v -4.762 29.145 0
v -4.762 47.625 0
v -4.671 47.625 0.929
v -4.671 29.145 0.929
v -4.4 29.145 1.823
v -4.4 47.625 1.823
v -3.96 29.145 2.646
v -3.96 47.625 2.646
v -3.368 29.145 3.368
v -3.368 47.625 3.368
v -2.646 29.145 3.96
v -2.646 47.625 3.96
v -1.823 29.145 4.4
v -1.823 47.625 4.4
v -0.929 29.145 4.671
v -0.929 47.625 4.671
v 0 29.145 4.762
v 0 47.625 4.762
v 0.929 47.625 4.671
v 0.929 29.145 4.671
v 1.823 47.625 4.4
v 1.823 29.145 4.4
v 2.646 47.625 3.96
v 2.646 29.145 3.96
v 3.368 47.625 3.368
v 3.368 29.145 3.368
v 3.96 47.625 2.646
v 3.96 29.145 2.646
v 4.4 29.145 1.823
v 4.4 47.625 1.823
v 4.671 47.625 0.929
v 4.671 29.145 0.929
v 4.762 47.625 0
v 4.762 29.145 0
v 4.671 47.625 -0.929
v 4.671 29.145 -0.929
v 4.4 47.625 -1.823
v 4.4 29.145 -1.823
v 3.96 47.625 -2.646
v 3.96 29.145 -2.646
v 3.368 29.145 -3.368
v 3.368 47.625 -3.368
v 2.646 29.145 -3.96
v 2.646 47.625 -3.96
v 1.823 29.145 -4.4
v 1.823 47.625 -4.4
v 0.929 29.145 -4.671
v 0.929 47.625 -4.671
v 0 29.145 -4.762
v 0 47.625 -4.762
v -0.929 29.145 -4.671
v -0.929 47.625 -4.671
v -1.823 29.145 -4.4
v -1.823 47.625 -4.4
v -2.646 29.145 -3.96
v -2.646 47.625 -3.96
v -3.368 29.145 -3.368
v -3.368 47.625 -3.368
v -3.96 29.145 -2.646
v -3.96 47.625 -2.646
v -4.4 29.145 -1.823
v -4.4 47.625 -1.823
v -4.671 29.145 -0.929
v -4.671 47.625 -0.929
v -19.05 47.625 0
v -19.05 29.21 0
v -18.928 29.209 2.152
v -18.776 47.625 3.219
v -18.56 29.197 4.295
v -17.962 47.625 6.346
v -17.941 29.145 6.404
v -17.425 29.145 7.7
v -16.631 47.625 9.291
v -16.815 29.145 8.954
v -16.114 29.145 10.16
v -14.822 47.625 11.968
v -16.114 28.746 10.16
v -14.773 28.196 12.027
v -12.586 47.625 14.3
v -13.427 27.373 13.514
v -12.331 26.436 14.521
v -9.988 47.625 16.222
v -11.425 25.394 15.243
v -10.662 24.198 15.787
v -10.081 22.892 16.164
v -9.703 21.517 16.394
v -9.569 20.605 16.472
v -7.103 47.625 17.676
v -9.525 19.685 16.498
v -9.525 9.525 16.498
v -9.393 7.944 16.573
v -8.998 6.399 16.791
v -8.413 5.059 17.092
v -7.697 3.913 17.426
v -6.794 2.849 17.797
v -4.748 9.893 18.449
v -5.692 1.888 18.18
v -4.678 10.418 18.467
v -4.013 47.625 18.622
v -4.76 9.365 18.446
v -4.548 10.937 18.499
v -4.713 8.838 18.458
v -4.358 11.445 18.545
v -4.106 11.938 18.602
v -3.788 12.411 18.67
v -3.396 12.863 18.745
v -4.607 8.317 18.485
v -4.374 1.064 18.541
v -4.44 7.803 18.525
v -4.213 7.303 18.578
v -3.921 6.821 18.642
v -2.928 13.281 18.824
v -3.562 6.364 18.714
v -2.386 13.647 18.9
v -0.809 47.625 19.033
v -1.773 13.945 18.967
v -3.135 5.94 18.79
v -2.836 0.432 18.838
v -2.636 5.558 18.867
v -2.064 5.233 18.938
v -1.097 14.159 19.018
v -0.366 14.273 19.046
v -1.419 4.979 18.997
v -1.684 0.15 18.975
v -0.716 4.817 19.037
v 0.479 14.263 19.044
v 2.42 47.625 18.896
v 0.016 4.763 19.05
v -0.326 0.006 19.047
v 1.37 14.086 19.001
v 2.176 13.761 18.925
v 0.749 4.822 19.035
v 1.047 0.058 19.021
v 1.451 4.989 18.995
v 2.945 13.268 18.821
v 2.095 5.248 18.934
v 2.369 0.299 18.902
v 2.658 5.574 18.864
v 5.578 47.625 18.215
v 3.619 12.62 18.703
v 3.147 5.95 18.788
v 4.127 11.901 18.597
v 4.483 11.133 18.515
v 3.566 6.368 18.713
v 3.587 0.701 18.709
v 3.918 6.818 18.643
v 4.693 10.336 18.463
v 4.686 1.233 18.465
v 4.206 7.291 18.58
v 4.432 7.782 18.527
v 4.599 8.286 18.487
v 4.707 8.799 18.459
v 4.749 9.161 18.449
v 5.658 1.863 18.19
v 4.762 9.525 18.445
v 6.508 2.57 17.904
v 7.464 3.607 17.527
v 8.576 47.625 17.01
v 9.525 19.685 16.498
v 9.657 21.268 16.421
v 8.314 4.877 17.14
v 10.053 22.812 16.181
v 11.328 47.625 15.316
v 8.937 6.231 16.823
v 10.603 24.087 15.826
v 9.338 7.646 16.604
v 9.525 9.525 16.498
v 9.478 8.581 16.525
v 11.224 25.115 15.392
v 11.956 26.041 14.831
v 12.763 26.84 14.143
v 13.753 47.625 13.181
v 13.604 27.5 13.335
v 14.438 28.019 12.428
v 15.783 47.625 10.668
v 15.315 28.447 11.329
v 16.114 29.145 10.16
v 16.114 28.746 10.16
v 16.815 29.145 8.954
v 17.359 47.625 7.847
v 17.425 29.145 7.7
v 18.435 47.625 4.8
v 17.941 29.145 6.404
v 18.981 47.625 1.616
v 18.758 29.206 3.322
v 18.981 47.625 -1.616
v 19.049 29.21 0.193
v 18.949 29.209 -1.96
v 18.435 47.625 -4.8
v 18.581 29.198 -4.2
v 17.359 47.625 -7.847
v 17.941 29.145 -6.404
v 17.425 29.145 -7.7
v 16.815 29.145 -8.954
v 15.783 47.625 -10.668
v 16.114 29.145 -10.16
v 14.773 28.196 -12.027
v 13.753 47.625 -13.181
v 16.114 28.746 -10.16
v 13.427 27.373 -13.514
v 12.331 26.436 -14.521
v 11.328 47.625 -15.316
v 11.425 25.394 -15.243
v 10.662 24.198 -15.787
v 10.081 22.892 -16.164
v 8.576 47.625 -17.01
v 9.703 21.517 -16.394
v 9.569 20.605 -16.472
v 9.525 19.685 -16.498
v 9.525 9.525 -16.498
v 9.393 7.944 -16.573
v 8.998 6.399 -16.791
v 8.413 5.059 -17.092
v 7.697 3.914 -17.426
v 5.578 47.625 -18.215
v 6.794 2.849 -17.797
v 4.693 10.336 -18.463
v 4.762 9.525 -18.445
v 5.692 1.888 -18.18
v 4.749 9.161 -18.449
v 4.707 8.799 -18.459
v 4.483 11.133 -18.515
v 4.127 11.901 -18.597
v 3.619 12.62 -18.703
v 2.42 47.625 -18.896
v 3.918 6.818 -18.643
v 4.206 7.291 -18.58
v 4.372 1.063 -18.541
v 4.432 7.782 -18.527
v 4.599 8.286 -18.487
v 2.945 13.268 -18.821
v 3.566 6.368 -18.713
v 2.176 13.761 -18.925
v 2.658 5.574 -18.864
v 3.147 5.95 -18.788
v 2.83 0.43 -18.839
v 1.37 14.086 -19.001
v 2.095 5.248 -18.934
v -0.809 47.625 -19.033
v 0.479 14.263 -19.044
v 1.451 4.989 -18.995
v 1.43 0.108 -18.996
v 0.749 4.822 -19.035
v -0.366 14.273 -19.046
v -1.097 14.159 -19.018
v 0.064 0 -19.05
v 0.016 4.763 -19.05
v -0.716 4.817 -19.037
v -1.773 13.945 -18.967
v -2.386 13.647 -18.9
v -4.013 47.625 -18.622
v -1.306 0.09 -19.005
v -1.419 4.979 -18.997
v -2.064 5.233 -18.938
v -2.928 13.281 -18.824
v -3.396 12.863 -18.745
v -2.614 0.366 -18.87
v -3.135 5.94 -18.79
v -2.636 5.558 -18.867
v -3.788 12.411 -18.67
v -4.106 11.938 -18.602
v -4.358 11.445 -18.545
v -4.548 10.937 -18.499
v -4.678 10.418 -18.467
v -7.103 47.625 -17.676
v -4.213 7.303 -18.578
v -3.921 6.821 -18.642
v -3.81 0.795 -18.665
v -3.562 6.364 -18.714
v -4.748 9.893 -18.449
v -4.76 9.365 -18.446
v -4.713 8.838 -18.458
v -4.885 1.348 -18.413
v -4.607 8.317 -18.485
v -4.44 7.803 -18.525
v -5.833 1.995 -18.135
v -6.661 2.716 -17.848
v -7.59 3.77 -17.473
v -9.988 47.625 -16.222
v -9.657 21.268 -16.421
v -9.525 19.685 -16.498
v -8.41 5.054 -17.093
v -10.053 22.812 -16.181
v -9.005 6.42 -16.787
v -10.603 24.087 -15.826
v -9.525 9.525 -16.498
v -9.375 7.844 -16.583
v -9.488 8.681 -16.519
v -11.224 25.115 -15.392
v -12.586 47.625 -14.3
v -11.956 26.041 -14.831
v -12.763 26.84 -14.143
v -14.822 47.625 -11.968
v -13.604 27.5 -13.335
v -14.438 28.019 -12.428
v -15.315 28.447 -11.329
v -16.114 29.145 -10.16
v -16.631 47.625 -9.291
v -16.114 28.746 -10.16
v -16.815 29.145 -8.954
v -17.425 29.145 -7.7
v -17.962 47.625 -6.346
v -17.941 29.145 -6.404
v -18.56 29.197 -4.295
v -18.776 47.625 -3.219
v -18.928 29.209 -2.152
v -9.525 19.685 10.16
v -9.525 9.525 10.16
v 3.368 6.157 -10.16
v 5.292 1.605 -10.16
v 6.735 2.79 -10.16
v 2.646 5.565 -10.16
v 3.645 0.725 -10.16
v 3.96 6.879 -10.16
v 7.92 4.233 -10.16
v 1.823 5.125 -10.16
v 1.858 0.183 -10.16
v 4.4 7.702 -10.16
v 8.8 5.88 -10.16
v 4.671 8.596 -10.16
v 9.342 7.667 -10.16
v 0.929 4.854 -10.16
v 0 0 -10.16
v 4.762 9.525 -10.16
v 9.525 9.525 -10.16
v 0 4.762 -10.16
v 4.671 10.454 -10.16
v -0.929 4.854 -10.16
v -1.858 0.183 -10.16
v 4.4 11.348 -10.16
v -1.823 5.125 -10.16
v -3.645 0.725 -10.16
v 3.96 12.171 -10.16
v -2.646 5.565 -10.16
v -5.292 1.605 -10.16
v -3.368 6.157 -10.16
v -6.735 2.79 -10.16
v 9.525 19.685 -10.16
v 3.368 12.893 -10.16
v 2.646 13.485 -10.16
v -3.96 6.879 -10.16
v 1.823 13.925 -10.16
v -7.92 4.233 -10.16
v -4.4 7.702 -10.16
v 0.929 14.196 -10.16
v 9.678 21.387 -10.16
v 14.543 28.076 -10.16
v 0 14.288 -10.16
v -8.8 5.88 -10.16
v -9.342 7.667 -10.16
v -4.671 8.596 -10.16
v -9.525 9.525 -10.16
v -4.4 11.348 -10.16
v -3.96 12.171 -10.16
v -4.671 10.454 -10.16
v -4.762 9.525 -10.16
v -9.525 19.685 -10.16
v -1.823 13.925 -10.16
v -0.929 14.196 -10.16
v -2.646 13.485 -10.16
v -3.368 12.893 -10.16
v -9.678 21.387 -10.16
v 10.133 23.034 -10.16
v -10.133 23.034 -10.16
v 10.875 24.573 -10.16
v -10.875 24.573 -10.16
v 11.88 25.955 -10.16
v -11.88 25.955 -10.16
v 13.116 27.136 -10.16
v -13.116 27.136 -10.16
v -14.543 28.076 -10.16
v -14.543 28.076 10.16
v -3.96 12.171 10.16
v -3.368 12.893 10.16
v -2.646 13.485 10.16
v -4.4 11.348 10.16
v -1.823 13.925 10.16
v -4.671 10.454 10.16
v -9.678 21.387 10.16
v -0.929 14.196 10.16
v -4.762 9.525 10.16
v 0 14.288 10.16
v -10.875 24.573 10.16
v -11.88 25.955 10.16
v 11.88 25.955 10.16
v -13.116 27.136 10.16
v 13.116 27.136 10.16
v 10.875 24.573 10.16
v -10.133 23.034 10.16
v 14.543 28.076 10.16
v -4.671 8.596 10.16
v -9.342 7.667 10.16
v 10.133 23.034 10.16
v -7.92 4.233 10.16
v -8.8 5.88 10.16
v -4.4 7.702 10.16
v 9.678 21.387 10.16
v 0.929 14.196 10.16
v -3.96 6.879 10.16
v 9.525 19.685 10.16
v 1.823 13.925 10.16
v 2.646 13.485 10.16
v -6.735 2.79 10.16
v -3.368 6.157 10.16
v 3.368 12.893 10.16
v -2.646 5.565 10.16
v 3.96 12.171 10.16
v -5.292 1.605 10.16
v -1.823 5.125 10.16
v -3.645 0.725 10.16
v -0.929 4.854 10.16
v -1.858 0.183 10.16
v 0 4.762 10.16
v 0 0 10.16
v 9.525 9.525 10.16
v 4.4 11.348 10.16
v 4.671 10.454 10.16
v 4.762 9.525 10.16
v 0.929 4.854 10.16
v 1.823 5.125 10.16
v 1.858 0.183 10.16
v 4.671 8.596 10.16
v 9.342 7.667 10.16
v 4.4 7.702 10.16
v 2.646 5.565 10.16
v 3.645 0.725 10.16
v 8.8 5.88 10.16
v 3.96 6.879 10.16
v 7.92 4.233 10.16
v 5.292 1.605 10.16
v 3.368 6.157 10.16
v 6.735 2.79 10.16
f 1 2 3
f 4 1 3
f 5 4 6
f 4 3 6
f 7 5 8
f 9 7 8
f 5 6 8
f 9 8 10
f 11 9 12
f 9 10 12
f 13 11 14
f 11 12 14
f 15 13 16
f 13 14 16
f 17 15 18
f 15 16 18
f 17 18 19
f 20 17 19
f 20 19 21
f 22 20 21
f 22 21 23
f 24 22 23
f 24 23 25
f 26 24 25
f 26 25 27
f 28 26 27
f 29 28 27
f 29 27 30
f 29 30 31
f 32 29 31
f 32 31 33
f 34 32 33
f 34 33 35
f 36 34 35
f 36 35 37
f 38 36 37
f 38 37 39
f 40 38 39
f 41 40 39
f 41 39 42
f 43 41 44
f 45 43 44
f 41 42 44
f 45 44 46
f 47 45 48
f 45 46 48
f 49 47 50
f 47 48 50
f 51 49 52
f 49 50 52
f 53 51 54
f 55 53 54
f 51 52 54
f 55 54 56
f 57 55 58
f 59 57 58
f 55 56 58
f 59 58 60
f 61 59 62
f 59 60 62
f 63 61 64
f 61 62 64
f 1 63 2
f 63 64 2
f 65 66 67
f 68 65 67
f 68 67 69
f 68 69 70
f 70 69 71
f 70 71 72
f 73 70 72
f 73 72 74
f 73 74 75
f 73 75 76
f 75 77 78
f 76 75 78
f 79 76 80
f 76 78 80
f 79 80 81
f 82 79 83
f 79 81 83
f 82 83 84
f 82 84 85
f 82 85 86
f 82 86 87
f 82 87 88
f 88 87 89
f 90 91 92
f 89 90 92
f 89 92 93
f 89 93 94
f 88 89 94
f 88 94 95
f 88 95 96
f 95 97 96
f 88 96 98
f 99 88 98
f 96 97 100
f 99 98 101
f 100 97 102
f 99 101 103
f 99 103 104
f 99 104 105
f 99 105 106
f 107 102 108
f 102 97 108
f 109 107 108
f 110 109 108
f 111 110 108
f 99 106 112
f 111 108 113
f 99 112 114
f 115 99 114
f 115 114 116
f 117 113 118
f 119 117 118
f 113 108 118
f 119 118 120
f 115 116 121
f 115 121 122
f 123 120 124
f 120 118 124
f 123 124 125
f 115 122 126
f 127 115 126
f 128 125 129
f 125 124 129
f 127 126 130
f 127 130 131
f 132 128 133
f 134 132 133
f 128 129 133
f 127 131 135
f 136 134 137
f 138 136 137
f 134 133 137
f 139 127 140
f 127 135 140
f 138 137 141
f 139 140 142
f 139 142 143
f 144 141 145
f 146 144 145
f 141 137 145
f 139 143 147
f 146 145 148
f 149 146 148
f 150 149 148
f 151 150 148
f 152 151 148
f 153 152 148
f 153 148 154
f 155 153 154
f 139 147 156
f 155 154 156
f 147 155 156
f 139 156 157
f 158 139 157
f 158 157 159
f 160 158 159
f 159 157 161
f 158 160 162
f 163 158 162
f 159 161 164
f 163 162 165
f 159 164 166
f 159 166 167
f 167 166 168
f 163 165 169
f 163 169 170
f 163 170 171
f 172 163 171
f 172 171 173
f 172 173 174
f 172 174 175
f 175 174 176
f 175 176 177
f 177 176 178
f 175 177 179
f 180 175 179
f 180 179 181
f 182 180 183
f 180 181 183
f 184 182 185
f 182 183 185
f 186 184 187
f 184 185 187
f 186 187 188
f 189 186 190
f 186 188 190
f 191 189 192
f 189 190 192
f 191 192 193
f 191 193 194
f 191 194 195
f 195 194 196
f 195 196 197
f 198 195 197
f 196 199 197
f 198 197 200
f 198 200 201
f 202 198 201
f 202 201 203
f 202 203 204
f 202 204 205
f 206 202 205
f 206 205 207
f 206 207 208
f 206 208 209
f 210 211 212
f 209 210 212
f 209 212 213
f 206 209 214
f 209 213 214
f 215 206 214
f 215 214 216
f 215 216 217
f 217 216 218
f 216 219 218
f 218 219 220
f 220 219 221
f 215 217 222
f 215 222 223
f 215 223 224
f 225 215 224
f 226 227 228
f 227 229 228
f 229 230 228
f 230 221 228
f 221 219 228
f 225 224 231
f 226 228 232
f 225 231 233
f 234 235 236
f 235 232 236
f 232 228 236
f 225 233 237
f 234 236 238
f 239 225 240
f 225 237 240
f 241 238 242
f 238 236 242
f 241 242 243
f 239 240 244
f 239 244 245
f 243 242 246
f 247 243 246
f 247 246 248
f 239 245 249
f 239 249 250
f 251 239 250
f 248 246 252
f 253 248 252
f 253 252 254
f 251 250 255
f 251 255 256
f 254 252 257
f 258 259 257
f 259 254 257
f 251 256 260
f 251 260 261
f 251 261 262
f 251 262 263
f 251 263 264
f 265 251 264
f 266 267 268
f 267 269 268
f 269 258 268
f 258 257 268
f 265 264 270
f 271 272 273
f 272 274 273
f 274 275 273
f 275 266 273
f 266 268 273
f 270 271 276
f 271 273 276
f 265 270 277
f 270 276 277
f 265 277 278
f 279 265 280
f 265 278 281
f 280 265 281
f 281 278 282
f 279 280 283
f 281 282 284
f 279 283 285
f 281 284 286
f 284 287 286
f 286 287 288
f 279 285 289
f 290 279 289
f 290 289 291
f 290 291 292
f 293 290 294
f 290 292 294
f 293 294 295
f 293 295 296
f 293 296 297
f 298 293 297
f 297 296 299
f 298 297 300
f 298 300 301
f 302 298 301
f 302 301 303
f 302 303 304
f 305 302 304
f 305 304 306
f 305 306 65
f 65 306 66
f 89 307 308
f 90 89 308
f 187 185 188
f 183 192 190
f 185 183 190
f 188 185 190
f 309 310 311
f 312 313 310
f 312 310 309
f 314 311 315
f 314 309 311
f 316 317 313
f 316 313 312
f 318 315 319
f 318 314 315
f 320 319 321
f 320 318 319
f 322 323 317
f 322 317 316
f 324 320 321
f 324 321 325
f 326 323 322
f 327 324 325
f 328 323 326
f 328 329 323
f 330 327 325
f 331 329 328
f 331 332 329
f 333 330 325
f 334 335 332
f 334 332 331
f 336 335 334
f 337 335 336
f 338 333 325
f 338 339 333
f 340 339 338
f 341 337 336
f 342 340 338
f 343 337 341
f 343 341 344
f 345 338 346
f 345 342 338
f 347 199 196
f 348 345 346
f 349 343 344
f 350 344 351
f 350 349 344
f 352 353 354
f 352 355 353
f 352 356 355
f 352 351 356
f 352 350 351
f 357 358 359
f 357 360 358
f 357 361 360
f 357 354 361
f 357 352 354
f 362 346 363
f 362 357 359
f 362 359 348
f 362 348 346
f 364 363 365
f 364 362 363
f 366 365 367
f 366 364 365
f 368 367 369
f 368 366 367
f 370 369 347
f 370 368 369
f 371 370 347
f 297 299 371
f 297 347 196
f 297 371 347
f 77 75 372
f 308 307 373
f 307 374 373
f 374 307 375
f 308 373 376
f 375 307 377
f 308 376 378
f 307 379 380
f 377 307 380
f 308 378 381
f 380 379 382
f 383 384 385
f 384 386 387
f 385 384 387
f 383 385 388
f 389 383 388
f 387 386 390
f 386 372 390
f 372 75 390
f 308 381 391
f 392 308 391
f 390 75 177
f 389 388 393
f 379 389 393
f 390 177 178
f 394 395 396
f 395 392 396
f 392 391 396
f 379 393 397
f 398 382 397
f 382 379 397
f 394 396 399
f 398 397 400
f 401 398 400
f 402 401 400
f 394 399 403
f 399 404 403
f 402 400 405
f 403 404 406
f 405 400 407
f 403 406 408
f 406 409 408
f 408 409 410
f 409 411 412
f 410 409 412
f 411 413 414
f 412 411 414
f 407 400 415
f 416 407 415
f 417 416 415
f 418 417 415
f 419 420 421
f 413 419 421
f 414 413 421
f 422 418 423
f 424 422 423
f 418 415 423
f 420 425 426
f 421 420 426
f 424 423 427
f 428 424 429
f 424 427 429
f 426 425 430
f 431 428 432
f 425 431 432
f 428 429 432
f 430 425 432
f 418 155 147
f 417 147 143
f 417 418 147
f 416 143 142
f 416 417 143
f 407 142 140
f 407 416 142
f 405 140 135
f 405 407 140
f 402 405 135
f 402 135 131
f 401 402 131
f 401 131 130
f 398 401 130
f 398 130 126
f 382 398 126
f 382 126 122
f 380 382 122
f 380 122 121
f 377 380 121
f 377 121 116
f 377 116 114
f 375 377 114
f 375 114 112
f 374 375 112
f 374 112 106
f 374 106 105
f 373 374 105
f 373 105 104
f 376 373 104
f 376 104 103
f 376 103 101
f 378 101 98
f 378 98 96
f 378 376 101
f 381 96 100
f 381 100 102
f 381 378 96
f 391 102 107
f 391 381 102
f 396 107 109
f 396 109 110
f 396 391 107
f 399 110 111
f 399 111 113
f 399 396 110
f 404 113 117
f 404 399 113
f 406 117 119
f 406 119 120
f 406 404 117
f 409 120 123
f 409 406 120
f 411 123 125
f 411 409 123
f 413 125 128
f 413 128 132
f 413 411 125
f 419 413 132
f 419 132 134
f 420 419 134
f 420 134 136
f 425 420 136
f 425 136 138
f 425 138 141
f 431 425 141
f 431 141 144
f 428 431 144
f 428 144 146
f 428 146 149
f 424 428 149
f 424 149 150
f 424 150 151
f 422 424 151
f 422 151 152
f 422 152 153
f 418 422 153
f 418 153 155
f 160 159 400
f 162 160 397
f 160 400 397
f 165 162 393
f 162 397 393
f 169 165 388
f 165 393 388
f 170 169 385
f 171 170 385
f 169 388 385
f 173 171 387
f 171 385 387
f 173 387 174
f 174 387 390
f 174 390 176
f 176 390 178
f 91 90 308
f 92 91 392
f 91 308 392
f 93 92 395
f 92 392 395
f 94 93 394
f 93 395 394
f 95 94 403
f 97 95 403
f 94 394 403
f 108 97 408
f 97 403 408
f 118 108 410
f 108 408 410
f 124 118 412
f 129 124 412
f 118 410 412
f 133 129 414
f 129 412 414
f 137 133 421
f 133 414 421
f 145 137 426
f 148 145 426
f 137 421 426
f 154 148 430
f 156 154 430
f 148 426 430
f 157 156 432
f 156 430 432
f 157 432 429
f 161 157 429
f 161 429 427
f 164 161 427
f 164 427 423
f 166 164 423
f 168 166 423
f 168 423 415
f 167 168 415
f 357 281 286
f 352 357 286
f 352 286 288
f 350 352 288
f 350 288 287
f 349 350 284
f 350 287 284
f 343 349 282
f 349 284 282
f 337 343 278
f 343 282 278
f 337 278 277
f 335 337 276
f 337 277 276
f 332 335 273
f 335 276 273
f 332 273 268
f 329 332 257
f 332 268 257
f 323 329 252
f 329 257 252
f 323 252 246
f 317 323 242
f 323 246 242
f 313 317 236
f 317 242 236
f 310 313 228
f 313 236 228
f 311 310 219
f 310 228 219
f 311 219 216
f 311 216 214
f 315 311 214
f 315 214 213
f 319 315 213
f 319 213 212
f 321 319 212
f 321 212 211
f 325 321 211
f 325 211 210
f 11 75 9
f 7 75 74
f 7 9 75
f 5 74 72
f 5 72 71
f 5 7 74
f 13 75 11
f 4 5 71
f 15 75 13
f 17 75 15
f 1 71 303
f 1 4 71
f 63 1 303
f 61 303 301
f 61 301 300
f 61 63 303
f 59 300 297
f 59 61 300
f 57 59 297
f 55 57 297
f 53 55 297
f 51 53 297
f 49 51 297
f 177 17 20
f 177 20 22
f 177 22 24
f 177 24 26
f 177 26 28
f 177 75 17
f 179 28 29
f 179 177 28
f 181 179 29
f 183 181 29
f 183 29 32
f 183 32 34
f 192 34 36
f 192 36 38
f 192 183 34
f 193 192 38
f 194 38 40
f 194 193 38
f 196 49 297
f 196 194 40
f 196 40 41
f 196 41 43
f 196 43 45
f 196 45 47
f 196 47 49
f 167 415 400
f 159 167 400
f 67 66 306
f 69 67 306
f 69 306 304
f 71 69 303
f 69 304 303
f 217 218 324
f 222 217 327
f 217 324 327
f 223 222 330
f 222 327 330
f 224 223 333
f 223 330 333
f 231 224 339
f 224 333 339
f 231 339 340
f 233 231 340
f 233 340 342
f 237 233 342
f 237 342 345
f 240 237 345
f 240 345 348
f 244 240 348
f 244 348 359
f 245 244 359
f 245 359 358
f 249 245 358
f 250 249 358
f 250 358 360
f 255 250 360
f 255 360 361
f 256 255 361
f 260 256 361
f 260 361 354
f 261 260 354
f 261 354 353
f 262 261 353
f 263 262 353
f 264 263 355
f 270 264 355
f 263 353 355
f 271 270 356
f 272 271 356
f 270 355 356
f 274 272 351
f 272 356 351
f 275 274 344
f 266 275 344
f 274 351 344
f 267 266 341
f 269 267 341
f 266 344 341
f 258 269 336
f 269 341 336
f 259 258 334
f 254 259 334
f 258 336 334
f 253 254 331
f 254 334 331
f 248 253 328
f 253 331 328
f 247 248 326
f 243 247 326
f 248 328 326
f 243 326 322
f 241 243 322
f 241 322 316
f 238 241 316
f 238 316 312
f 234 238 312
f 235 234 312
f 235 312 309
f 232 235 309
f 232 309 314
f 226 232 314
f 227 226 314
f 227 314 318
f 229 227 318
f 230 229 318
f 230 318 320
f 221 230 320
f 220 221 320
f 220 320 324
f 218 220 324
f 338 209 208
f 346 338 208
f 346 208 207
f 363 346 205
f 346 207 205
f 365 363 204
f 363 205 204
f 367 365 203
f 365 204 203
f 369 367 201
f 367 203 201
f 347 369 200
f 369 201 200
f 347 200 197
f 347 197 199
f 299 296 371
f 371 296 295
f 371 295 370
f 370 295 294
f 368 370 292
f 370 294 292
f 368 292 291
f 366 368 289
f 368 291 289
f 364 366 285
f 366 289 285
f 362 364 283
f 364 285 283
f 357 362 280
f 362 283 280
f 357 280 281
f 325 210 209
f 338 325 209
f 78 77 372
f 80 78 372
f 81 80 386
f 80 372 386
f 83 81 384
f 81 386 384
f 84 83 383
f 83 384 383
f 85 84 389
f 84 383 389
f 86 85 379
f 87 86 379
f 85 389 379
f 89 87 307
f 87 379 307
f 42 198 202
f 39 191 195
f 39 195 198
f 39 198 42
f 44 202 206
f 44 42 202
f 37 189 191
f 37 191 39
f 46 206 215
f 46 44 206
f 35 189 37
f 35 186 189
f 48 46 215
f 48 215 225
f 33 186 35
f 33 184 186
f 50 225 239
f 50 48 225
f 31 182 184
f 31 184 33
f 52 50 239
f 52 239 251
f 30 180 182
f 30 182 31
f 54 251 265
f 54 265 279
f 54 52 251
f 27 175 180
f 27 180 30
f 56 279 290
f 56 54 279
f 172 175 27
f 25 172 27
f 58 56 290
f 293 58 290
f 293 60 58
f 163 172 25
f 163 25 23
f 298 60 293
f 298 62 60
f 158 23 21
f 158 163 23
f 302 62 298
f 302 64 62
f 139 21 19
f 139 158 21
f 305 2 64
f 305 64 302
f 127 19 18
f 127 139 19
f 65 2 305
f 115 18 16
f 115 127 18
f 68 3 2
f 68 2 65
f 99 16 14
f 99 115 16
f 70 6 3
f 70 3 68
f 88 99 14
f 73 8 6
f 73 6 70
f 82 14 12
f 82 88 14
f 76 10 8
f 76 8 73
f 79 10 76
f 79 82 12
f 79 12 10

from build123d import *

# Parameters (mm, degrees)
SKETCH1_R               = 19.05
BASE_EXTRUDE_DEPTH      = 47.625
CUT_EXTRUDE1_DEPTH      = 20.05
CUT_EXTRUDE1_DEPTH_BACK = 20.05
CUT_EXTRUDE5_DEPTH      = 20.0500001
CUT_EXTRUDE5_DEPTH_BACK = 20.0500001
SKETCH11_R              = 4.7625
CUT_EXTRUDE6_DEPTH      = 20.0500001
CUT_EXTRUDE6_DEPTH_BACK = 20.0500001
SKETCH12_R              = 4.7625
CUT_EXTRUDE7_DEPTH      = 48.625000104


with BuildPart() as part:
    # Sketch1 → Base-Extrude (new body)
    with BuildSketch(Plane(origin=(0, 0, 0), x_dir=(-1, 0, 0), z_dir=(0, 1, 0))):
        Circle(SKETCH1_R)
    extrude(amount=BASE_EXTRUDE_DEPTH)

    # Sketch2 → Cut-Extrude1 (cut, two sides)
    with BuildSketch(Plane.XY) as cut_extrude1_sk:
        with BuildLine():
            Line((-19.05, -131.979516723), (-19.05, 0))
            Line((-19.05, 0), (-19.05, 29.21))
            ThreePointArc((-19.05, 29.21), (-12.314807909, 26.420192091), (-9.525, 19.685))
            Line((-9.525, 19.685), (-9.525, 9.525))
            ThreePointArc((-9.525, 9.525), (0, 0), (9.525, 9.525))
            Line((9.525, 9.525), (9.525, 19.685))
            ThreePointArc((9.525, 19.685), (12.314807909, 26.420192091), (19.05, 29.21))
            Line((19.05, 29.21), (19.05, 0))
            Line((19.05, 0), (19.05, -131.979516723))
            Line((19.05, -131.979516723), (19.05, -395.938550169))
            Line((19.05, -395.938550169), (-19.05, -395.938550169))
            Line((-19.05, -395.938550169), (-19.05, -131.979516723))
        make_face()
    extrude(amount=CUT_EXTRUDE1_DEPTH, mode=Mode.SUBTRACT)
    extrude(cut_extrude1_sk.sketch, amount=-CUT_EXTRUDE1_DEPTH_BACK, mode=Mode.SUBTRACT)

    # Sketch8 → Cut-Extrude5 (cut, two sides)
    with BuildSketch(Plane(origin=(0, 0, 0), x_dir=(0, 0, -1), z_dir=(1, 0, 0))) as cut_extrude5_sk:
        Polygon((-10.16, -121.738350451), (-10.16, 0), (-10.16, 29.145238826), (10.16, 29.145238826), (10.16, 0), (10.16, -121.738350451), (10.16, -365.215051352), (-10.16, -365.215051352), align=None)
    extrude(amount=CUT_EXTRUDE5_DEPTH, mode=Mode.SUBTRACT)
    extrude(cut_extrude5_sk.sketch, amount=-CUT_EXTRUDE5_DEPTH_BACK, mode=Mode.SUBTRACT)

    # Sketch11 → Cut-Extrude6 (cut, two sides)
    with BuildSketch(Plane.XY) as cut_extrude6_sk:
        with Locations((0, 9.525)):
            Circle(SKETCH11_R)
    extrude(amount=CUT_EXTRUDE6_DEPTH, mode=Mode.SUBTRACT)
    extrude(cut_extrude6_sk.sketch, amount=-CUT_EXTRUDE6_DEPTH_BACK, mode=Mode.SUBTRACT)

    # Sketch12 → Cut-Extrude7 (cut, through all)
    with BuildSketch(Plane(origin=(0, 47.625, 0), x_dir=(-1, 0, 0), z_dir=(0, 1, 0))):
        Circle(SKETCH12_R)
    extrude(amount=-CUT_EXTRUDE7_DEPTH, mode=Mode.SUBTRACT)


solid = part.part
